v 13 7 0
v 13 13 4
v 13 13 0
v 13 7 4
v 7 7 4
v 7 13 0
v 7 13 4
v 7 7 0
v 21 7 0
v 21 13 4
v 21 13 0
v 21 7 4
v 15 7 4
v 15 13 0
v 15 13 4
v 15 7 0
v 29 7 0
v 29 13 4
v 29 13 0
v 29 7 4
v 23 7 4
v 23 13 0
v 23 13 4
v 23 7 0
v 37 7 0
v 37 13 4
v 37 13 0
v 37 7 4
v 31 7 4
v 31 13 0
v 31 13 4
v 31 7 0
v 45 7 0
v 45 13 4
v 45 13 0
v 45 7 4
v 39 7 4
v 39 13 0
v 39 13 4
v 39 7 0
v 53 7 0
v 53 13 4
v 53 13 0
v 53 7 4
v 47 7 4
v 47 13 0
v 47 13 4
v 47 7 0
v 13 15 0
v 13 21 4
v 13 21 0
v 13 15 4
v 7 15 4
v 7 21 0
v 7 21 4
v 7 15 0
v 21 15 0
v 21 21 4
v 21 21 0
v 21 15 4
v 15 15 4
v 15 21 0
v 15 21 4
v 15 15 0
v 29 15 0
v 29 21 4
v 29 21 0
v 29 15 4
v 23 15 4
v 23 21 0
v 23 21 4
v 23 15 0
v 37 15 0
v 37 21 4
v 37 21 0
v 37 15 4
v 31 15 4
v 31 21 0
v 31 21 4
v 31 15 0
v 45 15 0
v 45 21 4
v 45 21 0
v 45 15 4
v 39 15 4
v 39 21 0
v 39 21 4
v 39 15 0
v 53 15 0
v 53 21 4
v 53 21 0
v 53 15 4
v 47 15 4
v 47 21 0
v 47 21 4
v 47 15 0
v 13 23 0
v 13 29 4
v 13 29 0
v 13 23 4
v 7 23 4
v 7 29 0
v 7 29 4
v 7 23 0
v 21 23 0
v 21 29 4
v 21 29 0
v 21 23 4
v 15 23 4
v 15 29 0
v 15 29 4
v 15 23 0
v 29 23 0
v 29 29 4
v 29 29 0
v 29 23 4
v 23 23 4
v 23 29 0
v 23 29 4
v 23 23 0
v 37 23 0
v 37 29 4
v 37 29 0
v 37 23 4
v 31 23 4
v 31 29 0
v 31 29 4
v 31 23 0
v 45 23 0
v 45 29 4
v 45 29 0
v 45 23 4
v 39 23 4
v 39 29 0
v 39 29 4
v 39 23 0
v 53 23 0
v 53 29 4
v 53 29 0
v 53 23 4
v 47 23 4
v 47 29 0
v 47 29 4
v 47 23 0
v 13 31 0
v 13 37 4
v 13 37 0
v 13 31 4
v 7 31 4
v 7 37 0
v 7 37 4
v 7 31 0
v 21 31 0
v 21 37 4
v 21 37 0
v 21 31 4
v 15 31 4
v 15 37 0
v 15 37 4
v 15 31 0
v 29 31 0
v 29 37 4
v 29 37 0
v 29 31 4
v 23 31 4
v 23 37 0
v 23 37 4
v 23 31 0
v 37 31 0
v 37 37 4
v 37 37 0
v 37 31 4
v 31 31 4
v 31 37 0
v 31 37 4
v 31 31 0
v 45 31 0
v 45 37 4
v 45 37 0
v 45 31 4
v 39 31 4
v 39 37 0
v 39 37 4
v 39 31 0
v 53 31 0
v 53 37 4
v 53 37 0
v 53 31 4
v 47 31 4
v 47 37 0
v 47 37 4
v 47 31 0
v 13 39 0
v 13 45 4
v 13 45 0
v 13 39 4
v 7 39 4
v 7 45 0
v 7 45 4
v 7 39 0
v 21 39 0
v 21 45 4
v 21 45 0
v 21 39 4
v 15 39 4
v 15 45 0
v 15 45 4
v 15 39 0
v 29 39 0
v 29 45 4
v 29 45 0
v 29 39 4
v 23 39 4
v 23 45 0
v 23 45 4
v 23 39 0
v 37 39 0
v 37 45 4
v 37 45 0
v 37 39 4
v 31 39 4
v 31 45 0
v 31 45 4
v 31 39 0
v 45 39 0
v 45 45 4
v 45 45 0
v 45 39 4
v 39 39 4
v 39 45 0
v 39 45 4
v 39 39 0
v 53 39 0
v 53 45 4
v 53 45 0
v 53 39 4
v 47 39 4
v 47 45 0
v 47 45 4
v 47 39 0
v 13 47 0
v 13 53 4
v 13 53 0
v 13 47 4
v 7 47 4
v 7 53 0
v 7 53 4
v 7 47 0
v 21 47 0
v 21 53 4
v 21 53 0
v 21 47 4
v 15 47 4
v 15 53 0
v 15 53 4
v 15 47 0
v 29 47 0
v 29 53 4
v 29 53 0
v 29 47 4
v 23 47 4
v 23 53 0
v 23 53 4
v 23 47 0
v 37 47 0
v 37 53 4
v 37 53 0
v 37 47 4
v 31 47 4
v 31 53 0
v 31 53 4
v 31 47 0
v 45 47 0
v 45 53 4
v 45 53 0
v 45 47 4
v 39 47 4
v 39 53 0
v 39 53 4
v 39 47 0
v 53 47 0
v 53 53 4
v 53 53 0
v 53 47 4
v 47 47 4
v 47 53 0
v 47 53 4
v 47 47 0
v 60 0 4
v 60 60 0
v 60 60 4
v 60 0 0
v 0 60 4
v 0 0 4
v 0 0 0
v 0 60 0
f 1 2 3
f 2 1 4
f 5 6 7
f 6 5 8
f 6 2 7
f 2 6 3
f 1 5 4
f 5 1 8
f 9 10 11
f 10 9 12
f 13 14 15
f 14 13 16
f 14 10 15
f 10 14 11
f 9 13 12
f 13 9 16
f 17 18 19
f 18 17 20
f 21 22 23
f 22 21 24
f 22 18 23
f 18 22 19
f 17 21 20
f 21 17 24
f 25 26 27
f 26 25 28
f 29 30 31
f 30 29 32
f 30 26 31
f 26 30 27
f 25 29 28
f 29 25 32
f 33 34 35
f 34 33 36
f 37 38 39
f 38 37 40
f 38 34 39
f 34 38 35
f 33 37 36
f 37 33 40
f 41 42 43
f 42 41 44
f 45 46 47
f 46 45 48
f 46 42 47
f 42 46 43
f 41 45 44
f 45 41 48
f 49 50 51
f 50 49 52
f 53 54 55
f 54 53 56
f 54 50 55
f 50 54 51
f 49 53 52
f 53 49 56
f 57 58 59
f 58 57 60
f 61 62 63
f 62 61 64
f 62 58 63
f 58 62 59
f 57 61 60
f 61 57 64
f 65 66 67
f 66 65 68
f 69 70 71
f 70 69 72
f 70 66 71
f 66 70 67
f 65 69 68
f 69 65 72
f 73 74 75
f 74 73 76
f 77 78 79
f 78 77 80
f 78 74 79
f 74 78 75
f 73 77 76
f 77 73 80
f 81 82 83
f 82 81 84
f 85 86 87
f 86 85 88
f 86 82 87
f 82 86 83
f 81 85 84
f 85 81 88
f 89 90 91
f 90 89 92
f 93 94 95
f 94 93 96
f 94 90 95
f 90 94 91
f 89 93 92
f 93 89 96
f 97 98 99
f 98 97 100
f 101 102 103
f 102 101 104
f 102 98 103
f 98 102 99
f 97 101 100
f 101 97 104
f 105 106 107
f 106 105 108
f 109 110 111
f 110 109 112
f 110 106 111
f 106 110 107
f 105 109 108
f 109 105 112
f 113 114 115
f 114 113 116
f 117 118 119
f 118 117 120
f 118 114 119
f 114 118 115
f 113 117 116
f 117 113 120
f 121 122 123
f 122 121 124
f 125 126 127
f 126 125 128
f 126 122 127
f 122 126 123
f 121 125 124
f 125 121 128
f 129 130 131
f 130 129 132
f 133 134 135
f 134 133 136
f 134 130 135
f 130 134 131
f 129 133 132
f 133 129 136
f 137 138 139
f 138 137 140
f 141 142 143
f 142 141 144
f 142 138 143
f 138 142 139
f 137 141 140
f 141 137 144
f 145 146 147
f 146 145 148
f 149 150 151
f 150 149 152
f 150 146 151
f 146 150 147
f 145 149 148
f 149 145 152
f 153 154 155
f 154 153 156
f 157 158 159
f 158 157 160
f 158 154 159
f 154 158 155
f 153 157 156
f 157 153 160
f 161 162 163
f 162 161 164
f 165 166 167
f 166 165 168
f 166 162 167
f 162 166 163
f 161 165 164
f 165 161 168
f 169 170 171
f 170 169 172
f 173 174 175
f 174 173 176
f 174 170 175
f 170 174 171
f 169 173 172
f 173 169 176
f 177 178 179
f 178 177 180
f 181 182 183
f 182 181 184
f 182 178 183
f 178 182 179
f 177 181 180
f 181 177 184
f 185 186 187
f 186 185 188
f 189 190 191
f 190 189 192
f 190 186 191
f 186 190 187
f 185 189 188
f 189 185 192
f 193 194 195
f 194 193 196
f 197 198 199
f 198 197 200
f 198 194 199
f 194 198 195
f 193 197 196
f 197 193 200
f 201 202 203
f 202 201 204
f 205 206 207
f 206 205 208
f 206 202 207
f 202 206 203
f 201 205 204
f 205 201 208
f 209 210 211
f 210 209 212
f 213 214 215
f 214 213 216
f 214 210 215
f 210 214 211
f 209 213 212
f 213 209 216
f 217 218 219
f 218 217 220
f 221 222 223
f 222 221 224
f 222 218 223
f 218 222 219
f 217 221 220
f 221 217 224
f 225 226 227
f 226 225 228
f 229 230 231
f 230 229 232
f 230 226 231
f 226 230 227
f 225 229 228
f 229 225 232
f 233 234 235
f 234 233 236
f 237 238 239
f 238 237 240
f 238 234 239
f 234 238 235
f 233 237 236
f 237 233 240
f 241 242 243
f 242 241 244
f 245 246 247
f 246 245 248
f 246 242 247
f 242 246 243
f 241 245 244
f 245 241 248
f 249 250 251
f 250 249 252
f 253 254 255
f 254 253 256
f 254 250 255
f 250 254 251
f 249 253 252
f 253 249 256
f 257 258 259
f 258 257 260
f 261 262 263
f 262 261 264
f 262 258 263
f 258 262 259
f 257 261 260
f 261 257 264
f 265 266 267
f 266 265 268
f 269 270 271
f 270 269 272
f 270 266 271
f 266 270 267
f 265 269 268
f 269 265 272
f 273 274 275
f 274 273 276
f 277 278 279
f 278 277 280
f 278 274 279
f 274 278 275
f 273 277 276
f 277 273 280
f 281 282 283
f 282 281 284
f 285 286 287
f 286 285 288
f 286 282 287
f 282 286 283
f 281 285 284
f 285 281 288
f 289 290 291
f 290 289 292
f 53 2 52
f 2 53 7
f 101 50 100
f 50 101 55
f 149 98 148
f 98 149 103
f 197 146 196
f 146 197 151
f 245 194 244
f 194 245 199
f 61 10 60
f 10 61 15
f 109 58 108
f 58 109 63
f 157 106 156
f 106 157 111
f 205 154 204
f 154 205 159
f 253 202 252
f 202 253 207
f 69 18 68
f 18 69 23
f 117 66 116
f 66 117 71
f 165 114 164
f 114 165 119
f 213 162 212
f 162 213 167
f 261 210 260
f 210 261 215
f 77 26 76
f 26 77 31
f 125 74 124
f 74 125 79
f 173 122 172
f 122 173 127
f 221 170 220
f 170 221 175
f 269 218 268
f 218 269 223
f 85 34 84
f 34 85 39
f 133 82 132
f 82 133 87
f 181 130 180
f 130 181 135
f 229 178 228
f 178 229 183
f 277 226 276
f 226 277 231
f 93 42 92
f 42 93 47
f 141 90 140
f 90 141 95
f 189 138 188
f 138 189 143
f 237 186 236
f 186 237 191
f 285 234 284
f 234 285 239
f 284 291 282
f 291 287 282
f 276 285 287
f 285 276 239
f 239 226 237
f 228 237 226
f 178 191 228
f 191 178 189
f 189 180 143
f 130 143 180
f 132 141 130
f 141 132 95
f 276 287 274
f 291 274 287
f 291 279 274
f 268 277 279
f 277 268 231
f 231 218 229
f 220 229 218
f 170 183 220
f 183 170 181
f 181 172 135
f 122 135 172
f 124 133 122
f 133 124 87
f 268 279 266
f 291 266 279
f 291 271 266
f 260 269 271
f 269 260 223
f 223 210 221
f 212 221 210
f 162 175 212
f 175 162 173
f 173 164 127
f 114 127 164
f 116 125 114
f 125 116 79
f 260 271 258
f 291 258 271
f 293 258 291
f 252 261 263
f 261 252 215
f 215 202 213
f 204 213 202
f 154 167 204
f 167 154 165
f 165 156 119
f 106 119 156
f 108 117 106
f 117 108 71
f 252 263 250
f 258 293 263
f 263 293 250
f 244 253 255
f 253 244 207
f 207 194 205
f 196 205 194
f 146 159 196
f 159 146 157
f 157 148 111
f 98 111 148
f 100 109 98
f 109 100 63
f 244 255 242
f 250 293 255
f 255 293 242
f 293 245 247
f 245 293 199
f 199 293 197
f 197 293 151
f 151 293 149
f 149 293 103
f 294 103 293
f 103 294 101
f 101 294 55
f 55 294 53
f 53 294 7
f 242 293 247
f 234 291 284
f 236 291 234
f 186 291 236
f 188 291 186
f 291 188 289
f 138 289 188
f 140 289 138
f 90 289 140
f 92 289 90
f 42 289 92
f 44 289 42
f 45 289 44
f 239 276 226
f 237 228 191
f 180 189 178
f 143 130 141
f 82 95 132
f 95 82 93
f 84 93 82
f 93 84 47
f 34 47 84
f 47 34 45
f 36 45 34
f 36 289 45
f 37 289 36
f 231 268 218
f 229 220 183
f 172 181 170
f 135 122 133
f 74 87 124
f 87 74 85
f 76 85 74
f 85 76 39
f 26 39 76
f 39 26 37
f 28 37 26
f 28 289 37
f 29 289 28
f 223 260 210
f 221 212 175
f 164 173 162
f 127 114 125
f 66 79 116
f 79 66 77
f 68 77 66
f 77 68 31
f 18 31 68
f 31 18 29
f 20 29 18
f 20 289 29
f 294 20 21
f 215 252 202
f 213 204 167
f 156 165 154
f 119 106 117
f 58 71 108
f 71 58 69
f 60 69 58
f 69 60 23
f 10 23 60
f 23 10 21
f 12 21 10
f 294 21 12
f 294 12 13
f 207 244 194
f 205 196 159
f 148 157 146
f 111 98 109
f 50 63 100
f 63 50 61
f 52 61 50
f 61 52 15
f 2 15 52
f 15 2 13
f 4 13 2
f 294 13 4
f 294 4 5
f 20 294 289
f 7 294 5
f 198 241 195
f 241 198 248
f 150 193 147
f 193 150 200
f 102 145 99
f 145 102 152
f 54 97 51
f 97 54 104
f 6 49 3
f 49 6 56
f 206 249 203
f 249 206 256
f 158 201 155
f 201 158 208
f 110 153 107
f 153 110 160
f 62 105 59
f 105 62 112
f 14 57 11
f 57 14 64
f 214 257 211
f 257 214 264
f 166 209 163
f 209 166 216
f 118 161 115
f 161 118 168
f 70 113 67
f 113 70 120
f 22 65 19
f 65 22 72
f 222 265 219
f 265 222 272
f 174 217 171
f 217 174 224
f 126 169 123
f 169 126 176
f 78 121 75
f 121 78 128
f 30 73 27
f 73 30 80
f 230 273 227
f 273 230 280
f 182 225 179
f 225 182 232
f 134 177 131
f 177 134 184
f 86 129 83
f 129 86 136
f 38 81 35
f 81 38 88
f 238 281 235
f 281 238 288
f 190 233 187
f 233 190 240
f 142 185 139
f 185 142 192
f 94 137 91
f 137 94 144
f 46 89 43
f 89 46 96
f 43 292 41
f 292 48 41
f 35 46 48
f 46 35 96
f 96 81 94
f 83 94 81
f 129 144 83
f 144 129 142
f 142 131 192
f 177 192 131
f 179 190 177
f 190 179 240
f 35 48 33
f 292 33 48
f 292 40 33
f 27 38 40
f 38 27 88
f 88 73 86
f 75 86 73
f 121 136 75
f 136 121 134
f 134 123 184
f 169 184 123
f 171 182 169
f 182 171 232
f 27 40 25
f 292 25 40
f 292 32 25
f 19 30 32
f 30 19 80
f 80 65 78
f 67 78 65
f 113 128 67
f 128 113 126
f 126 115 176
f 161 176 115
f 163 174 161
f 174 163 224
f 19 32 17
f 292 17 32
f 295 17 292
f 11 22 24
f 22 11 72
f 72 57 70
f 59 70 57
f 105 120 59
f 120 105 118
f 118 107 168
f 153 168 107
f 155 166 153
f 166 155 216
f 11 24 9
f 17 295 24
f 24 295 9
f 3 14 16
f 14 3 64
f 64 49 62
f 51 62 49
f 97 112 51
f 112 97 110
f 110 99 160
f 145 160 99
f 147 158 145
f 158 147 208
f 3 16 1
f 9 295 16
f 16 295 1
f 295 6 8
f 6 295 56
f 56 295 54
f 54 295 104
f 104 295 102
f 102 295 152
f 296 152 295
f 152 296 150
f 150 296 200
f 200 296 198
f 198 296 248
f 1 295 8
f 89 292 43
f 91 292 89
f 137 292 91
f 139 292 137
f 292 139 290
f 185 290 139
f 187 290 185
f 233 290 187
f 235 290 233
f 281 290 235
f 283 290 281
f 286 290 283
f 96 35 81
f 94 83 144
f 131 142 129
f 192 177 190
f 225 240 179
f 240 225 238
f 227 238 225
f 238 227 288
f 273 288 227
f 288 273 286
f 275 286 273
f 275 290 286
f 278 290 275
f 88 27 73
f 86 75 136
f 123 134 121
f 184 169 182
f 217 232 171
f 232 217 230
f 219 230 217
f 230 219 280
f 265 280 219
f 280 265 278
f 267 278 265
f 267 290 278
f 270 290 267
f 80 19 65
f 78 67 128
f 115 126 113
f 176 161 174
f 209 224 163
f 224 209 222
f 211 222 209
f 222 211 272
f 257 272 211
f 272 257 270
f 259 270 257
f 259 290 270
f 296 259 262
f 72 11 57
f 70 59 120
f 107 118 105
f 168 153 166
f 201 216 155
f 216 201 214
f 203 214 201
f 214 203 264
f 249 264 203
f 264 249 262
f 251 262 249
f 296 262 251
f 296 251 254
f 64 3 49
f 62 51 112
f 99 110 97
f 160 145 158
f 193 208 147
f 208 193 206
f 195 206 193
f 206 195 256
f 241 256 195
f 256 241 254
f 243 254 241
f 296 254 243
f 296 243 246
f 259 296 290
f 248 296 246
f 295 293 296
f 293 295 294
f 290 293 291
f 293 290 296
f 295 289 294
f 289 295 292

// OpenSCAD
w = 60;
h = 60;
d = 4;

hw=6;
hw_gap=2;
count=w / (hw + hw_gap);

difference(){
cube([w, h, d]);
 
for(i = [1:count-1]){
for(a = [1:count-1])
    color("red")
    translate([a*(hw+hw_gap)-1,i*(hw + hw_gap)-1, -1])
    cube([hw,hw,d+2]);
}
   }
   
